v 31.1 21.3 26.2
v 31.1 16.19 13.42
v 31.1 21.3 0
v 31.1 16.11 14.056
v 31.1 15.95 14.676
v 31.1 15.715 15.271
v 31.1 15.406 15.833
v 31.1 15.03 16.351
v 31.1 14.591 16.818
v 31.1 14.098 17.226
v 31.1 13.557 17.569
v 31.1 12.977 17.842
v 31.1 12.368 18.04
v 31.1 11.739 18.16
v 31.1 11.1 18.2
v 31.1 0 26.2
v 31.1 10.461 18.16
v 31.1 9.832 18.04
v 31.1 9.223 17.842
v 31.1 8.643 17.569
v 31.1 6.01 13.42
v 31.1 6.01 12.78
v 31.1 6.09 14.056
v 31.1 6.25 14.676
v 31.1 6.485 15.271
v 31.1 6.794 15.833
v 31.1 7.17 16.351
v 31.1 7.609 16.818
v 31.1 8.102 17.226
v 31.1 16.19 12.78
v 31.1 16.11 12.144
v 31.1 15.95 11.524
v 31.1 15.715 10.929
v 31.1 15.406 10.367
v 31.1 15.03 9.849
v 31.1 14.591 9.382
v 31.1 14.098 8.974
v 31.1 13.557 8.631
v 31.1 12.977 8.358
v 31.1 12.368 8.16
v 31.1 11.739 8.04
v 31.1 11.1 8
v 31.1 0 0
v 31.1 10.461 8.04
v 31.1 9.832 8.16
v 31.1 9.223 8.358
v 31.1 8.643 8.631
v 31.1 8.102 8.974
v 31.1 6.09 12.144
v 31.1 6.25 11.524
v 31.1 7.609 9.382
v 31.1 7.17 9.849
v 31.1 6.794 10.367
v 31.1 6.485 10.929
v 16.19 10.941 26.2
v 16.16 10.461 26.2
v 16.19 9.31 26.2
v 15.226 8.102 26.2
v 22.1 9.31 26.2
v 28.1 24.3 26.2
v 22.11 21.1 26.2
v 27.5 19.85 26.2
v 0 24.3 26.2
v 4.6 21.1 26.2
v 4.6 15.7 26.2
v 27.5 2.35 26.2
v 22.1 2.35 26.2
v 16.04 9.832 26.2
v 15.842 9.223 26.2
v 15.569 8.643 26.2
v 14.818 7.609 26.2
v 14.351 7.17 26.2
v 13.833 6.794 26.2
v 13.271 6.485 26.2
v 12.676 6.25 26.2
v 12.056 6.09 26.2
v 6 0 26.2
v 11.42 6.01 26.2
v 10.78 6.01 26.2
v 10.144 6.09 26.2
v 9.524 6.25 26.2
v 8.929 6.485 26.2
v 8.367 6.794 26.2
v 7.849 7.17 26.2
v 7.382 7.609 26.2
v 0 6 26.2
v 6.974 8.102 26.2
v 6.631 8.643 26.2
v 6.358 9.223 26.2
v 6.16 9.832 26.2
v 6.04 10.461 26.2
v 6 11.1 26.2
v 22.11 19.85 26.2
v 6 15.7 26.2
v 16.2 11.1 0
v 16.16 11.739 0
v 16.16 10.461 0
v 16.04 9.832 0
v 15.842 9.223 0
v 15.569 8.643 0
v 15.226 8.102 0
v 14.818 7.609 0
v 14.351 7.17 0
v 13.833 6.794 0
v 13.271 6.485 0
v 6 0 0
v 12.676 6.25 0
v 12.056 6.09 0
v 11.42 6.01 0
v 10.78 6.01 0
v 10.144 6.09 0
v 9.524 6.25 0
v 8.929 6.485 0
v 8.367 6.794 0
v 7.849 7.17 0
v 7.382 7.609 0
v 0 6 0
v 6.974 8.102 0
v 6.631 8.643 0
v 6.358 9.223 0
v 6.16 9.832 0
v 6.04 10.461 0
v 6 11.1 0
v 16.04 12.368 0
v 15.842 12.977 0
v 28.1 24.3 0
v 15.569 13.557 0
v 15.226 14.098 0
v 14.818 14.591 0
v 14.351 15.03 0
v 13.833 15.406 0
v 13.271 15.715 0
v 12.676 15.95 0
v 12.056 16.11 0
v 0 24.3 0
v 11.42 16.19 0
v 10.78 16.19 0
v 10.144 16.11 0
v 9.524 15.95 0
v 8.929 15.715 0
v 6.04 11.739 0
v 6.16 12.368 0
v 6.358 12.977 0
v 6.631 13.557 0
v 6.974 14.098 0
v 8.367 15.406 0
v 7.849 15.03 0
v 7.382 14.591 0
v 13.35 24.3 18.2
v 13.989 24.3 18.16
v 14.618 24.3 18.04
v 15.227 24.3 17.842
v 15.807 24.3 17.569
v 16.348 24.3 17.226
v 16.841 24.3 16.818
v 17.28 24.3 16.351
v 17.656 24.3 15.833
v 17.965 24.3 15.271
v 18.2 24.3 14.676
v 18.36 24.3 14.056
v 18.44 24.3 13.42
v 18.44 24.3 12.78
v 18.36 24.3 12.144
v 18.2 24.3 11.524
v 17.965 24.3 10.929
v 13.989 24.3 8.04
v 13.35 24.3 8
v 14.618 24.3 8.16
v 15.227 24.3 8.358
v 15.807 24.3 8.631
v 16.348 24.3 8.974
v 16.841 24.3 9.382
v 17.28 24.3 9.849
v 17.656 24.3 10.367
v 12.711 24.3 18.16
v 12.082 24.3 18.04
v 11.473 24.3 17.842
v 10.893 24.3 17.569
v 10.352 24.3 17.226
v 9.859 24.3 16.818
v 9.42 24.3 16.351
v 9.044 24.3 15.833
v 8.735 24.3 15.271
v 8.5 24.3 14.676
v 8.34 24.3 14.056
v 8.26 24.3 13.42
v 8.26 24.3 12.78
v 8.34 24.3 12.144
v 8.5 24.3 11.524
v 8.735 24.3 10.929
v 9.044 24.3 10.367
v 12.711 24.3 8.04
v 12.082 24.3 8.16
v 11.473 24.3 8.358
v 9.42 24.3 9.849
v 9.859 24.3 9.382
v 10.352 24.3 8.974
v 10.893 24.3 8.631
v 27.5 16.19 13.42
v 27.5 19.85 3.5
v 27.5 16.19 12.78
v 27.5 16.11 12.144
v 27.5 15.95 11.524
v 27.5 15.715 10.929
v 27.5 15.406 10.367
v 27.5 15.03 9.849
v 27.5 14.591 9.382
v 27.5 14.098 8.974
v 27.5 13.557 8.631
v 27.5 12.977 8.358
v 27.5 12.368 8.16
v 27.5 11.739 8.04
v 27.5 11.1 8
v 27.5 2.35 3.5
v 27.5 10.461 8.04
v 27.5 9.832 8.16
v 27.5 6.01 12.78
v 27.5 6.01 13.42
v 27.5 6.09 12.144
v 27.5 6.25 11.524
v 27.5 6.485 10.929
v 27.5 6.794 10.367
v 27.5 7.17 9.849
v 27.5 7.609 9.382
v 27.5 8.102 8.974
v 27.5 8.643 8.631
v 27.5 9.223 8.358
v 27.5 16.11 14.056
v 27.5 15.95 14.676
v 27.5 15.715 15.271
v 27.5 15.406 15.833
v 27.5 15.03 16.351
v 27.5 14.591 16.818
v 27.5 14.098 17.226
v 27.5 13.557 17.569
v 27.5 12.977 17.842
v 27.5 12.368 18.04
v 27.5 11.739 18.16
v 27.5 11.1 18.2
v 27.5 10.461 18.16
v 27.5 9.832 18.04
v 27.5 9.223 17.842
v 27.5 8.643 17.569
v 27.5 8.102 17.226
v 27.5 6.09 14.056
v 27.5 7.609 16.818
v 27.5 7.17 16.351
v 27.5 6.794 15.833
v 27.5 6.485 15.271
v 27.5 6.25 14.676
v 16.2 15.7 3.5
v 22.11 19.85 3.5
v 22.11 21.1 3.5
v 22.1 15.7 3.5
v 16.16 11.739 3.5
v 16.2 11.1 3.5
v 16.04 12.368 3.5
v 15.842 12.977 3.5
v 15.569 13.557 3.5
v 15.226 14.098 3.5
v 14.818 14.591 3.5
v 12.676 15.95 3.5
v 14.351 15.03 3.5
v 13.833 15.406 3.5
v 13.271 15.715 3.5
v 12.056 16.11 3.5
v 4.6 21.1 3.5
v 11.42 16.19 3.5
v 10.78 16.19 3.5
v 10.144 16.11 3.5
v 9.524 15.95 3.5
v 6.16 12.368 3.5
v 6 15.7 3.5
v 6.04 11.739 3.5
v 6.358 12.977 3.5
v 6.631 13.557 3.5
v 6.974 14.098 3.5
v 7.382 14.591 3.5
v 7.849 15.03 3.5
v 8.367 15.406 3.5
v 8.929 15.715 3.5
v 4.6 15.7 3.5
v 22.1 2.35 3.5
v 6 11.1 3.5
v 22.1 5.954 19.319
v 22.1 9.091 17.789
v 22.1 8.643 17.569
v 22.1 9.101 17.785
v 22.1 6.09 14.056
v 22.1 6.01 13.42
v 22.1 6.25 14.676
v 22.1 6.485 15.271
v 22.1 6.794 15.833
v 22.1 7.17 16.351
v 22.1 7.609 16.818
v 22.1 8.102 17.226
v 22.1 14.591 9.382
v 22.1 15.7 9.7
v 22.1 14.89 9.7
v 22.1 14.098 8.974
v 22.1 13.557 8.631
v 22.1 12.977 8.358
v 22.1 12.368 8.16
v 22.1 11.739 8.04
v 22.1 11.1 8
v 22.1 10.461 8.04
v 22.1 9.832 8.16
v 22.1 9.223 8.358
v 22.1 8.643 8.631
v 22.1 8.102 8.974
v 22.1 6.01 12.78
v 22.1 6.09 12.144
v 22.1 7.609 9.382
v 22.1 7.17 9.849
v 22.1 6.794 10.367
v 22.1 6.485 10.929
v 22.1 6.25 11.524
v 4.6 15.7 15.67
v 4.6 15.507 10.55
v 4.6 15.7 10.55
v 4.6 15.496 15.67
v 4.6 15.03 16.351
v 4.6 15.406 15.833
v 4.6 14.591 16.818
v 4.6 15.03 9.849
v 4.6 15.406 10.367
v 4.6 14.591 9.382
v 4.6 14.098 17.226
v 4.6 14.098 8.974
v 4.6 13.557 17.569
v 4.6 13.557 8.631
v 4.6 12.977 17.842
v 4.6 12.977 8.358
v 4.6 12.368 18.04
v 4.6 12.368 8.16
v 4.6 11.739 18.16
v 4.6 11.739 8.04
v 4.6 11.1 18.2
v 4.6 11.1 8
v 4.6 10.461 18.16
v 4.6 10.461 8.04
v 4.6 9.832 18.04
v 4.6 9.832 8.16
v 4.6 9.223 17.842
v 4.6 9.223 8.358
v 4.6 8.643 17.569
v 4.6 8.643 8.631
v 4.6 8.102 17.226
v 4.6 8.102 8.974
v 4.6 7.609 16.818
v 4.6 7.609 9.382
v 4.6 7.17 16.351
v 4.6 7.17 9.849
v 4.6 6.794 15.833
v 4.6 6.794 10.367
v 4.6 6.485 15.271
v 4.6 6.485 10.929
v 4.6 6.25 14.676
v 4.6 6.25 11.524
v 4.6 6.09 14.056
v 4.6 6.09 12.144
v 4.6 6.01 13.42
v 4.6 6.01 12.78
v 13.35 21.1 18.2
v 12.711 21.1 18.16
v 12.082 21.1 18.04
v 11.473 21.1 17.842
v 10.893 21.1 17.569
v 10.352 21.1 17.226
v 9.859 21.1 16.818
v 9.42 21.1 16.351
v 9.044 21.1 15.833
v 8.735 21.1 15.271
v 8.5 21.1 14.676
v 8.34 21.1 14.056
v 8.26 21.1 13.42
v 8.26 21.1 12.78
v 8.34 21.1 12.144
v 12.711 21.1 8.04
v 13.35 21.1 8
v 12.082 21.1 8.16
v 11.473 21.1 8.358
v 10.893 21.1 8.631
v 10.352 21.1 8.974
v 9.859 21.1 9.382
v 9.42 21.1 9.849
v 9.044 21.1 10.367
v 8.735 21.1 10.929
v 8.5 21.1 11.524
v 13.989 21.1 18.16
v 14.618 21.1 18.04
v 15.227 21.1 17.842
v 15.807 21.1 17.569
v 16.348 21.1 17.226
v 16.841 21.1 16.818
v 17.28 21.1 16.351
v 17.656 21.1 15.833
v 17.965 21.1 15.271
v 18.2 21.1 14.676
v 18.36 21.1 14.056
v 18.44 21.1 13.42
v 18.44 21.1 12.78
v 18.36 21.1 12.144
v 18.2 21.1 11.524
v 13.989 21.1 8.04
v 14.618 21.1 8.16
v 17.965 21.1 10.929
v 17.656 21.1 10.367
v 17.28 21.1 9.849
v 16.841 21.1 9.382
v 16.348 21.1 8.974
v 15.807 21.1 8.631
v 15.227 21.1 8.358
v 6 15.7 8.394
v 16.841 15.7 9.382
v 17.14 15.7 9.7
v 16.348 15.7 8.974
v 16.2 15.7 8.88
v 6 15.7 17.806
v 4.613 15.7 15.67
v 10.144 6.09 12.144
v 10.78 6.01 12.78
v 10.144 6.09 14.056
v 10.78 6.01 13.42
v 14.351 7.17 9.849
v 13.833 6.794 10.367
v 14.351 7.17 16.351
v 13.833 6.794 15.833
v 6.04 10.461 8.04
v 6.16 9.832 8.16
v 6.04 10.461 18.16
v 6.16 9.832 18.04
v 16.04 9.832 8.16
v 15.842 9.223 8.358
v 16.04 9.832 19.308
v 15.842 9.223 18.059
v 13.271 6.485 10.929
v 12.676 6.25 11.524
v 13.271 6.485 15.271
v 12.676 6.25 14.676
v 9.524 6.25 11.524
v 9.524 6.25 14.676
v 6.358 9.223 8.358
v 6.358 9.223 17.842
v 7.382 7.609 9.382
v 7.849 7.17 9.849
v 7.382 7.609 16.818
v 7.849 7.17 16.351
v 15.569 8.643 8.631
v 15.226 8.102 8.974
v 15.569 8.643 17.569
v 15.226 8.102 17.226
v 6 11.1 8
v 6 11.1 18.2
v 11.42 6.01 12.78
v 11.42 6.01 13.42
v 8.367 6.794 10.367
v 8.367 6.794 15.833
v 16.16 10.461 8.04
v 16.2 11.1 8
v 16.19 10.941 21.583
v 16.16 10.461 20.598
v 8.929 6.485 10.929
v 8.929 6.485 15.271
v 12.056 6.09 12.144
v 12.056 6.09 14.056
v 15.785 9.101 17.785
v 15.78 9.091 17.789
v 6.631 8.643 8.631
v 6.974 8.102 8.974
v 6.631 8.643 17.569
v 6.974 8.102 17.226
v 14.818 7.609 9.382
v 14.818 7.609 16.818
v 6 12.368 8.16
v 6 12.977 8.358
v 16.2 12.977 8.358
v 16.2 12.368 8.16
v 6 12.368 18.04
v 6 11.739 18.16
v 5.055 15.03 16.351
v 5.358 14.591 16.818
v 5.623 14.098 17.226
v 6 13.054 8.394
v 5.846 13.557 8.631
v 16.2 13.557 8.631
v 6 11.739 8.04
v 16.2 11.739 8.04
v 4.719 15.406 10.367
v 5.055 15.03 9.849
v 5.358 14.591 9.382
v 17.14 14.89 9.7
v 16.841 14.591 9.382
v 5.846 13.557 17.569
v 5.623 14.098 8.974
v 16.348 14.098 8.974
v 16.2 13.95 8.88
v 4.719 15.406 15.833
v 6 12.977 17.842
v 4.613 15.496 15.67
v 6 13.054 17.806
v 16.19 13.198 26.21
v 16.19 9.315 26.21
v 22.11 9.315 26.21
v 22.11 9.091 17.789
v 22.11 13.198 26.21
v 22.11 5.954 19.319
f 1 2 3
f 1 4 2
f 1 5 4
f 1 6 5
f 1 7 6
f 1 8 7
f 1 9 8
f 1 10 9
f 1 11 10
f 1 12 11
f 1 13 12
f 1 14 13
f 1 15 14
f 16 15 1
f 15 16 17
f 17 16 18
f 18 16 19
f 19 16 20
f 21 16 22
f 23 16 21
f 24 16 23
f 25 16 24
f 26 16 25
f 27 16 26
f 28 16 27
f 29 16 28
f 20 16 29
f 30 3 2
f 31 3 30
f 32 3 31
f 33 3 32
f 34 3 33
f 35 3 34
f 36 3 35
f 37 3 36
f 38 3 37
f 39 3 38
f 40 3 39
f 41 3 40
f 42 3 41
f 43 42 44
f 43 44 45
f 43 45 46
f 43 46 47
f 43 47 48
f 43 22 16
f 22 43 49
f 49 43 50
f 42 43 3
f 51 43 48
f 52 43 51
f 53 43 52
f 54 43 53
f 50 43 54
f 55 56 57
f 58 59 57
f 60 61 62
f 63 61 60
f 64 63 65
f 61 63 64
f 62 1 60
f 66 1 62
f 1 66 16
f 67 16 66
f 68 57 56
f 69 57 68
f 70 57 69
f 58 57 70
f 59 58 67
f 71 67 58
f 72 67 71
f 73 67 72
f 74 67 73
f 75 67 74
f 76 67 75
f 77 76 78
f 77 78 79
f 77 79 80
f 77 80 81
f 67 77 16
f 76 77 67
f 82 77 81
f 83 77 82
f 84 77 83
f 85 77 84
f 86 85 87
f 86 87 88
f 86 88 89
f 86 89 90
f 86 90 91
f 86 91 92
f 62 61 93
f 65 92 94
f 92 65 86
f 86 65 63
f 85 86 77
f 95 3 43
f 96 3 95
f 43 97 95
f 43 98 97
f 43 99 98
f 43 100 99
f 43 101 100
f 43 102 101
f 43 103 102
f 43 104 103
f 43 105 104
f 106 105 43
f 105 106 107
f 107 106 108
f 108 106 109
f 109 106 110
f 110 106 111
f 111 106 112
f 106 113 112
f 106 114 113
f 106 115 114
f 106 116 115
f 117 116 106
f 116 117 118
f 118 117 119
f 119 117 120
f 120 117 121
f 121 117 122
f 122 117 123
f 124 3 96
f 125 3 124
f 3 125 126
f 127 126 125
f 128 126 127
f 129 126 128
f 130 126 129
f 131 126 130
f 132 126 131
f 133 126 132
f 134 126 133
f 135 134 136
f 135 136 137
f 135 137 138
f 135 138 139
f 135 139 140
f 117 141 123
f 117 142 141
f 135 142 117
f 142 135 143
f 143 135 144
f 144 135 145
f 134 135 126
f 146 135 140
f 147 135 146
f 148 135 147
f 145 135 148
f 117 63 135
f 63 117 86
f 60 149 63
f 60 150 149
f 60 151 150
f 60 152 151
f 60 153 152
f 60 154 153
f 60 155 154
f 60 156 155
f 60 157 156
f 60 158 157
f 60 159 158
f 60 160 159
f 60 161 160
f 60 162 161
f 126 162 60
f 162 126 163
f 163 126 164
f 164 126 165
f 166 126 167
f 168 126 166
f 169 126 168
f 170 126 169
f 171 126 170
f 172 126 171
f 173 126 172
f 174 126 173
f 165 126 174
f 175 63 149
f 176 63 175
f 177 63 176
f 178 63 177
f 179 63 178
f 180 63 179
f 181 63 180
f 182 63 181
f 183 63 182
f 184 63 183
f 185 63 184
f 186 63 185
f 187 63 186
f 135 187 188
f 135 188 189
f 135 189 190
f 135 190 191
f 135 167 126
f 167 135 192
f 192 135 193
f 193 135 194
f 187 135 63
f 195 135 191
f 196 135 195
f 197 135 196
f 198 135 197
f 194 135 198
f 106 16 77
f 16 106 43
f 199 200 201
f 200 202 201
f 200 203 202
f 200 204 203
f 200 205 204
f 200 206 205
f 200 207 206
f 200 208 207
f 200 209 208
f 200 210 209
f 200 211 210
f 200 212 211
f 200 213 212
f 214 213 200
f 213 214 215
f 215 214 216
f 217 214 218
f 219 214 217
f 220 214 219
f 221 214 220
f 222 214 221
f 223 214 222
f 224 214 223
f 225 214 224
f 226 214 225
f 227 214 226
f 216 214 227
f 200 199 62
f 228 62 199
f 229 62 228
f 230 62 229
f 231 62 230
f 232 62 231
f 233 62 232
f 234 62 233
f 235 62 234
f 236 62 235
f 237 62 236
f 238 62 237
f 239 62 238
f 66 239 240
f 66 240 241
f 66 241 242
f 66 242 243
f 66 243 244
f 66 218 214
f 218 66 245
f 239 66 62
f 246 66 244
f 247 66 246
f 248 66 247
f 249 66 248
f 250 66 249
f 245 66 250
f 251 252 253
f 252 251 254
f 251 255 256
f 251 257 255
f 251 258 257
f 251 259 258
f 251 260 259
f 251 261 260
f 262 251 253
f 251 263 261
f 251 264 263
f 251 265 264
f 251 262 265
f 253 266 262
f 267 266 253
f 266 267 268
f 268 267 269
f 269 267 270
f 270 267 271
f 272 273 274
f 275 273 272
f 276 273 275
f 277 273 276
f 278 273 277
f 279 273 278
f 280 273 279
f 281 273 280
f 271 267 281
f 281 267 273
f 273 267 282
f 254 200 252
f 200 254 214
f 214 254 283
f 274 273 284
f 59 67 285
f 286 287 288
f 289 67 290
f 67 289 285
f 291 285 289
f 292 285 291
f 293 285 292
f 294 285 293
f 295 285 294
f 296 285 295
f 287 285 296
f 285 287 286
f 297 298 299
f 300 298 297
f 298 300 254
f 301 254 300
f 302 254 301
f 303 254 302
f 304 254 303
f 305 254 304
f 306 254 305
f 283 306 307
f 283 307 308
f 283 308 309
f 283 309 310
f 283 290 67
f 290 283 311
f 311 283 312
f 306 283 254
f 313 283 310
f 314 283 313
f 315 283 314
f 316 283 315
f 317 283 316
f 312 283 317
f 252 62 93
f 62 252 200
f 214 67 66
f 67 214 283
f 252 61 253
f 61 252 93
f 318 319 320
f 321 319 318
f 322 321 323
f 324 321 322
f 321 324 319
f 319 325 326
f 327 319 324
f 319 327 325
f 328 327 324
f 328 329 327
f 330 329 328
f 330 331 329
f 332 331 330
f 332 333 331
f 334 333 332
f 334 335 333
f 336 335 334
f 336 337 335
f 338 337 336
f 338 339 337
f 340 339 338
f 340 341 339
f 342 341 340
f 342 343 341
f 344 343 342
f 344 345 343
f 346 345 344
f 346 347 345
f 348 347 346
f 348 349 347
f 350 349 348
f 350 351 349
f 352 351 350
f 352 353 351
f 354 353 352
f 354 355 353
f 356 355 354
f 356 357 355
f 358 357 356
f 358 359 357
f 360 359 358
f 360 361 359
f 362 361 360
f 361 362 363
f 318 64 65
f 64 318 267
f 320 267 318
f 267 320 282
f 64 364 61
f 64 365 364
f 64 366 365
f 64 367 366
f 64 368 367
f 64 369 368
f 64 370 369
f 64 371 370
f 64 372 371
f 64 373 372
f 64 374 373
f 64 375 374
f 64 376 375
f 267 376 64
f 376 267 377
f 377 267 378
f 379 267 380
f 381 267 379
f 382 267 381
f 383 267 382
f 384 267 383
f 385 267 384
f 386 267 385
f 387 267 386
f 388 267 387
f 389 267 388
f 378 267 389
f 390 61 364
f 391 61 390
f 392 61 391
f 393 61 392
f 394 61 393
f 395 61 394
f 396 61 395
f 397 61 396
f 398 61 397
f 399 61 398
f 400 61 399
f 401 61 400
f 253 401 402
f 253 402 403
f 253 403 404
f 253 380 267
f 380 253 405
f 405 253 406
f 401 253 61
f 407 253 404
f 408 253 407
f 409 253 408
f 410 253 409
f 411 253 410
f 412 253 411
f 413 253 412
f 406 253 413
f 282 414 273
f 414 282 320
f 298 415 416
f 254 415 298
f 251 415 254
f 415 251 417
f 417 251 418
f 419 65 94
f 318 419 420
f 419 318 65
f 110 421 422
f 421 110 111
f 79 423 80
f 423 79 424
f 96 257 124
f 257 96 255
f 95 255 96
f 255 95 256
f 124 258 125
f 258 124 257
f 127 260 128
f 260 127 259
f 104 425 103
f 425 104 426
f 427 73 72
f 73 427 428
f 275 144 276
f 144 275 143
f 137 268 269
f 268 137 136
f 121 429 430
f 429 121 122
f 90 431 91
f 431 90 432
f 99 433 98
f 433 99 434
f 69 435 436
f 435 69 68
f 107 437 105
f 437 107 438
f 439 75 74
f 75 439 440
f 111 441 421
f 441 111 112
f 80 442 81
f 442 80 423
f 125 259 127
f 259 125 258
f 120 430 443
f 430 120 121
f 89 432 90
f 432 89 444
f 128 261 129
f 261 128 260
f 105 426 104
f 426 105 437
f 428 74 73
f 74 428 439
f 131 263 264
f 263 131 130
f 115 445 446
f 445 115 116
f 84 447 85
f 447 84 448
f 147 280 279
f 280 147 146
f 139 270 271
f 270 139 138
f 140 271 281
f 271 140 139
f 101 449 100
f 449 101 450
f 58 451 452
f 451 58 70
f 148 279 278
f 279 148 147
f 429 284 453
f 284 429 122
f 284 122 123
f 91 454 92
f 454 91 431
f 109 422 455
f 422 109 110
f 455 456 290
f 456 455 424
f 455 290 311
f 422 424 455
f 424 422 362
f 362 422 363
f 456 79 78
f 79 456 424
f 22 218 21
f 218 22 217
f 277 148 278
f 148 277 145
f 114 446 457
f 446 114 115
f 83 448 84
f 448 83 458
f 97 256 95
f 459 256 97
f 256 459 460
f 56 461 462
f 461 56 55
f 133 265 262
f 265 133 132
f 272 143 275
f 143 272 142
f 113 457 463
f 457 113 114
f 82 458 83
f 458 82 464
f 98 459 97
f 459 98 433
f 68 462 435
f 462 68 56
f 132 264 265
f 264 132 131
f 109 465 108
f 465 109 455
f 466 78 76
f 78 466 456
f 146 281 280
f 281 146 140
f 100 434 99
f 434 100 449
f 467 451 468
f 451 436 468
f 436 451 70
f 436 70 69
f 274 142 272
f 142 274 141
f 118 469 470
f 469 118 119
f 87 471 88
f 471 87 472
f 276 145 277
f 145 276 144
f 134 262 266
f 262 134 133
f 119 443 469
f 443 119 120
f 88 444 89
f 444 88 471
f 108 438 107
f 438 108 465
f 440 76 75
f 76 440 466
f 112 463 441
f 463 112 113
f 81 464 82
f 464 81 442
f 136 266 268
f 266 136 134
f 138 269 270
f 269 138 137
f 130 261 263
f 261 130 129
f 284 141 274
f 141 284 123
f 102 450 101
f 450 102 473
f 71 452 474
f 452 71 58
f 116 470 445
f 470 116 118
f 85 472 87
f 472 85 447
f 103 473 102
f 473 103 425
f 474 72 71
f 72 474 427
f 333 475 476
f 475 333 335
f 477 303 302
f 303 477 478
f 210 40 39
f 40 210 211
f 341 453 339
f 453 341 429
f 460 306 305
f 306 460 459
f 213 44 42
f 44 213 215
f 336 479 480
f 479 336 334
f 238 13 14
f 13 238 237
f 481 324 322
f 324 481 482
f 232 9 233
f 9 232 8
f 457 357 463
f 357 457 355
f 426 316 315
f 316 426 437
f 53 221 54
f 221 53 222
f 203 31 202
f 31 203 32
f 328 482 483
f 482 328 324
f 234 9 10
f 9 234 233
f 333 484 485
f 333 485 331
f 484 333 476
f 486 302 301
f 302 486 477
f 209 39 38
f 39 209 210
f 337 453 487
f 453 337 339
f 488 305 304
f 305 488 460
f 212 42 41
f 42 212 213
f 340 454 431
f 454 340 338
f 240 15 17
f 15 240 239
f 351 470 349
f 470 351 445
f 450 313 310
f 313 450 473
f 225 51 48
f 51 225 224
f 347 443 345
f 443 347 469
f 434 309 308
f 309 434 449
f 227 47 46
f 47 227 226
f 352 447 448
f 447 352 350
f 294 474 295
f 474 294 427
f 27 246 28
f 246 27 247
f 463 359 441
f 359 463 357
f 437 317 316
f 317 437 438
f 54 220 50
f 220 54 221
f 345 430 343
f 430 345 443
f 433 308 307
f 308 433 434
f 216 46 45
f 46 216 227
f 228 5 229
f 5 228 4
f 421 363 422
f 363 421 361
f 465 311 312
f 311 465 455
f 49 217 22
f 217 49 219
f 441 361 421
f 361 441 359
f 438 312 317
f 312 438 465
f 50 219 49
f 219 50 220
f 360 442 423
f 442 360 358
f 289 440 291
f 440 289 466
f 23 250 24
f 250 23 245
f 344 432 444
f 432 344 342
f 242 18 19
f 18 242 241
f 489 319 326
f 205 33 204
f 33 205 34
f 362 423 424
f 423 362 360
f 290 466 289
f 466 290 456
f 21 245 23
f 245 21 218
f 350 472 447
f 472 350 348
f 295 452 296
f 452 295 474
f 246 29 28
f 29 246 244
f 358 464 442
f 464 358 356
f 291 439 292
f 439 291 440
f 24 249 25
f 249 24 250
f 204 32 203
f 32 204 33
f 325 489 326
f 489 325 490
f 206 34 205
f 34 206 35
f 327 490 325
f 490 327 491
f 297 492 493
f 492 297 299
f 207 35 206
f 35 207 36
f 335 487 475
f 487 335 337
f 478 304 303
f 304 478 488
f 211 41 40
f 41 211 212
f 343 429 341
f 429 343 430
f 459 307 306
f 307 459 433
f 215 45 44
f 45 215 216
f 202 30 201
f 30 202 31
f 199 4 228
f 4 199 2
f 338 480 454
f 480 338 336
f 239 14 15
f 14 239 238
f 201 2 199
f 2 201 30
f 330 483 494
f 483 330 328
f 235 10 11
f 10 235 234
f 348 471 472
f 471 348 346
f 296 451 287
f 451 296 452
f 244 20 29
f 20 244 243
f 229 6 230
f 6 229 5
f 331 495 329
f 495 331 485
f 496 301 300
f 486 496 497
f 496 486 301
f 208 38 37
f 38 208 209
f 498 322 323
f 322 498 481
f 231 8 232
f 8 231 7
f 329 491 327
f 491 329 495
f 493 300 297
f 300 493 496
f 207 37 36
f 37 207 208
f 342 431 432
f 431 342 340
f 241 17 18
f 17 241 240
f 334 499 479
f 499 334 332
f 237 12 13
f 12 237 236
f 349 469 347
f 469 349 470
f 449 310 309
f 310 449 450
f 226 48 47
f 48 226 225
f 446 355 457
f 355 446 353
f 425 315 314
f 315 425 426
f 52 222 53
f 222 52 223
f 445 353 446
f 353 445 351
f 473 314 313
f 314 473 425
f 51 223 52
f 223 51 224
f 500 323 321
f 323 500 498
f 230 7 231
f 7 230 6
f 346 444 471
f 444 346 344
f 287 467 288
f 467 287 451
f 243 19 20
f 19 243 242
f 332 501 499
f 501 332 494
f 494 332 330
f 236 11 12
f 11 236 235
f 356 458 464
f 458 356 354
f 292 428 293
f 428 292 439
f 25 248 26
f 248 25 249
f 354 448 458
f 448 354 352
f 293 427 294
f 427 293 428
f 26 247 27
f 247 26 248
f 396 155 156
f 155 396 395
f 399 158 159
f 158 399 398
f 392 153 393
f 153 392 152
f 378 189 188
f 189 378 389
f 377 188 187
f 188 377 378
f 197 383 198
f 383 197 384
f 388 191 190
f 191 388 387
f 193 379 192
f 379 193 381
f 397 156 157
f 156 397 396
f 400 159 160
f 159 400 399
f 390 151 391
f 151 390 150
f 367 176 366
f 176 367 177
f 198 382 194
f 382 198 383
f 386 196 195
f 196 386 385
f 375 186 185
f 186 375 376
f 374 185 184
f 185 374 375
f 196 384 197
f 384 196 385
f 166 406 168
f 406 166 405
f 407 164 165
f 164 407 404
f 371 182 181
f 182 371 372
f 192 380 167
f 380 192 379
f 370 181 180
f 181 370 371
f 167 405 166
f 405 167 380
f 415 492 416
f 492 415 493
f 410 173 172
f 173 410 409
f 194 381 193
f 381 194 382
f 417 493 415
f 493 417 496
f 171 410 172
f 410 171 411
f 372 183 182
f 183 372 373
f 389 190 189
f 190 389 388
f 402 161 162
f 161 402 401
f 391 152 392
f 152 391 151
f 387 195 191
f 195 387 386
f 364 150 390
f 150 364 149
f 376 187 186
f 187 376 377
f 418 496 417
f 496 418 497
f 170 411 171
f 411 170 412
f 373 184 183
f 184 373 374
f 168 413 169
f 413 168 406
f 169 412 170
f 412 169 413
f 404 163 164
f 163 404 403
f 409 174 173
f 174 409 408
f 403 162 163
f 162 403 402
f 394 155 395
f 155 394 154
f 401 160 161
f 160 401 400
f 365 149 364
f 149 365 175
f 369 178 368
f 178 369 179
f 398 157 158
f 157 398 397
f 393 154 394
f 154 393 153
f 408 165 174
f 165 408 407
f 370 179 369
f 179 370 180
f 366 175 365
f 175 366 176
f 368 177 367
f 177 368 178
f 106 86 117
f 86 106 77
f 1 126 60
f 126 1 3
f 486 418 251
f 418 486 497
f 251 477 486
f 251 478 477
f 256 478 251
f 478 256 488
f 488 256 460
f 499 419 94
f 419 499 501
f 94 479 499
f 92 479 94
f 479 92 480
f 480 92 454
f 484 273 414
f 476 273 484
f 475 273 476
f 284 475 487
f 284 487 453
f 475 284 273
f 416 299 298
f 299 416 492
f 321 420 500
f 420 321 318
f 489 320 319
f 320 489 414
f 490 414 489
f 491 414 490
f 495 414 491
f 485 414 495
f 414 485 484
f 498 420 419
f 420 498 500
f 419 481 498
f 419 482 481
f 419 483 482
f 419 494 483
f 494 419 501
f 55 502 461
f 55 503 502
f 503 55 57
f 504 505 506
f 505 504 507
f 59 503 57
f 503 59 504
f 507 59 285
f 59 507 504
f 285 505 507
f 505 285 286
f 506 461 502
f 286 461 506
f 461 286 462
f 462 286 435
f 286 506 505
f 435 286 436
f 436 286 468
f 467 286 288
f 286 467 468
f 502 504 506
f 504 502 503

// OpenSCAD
// file: nut.scad
// Nut model.

$fn = 50;
OX = 0.01;

// 2D nut polygon.
module regular_polygon(order, r = 1) {
    angles = [for(i = [0 : order - 1]) i * (360 / order)];
    coords = [for(th = angles) [r * cos(th), r * sin(th)]];
    polygon(coords);
}

// Simple nut model.
// d - rod diameter.
// m - nut height.
// e - max outer nut diameter.
// order - nut corner count.
// material - nut color.
module nut(d = 10, m = 5, e = 20, order = 6, material = [0.8, 0.8, 0.8]) {
    color(material) difference() {
        linear_extrude(height = m) regular_polygon(order, e / 2);
        translate([0, 0, -OX]) cylinder(r = d / 2, h = m + 2 * OX);
    }
}

// Example:
nut(10, 5, 20);
// main file
// Rod mount.

use <nut.scad>;

$fn = 50;
OX = 0.01;

// Base model for printing.
// d - rod diameter.
// m - nut height.
// e - max outer nut diameter.
// s - min outer nut diameter.
// plexiglass - plexiglass thickness.
module rod_mount(d = 10 + 0.2, m = 5 + 0.4, e = 19 + 0.2, s = 17 + 0.5, plexiglass = 6) {
	biasX = 7.25 - 5.0; // Radiator rod X bias (difference between rod radius and EKWB fan hole).
	biasY = -0.5; // Radiator rod Y bias (default ~ 3.0).
	borderX = 3.6; // Support border width.
	borderY = 3.2;
	borderZ = 3.5; // Hidden side borders.
	bulkhead = 0.0; // Bulkhead offset (default ~ 1.5).
	radius = d / 2;
	pr = plexiglass + radius;
	// Mount dimensions:
	y = plexiglass + d + biasY + m + borderY;
	x = pr + biasX + s / 2 + m + borderX + bulkhead; // Make model more square.
	z = e + 2 * borderZ;
	// Model:
	difference() { 
		union() {
			// Main model:
			difference() {
				// Base:
				cube([x, y, z]);
				// Nut places:
				translate([pr + biasX + s / 2 + bulkhead, pr - s / 2, borderZ]) difference() {
					cube([m, s, e + borderZ + OX]);
				}
				translate([pr + biasX - s / 2, plexiglass + d + biasY, borderZ]) difference() {
					cube([s + OX, m, e + borderZ + OX]);
				}
				// Rod holes:
				translate([pr, pr, -OX]) cylinder(r = radius, h = z + 2 * OX); // Side rod hole.
				translate([plexiglass - (s - d) / 2 + biasX, pr, borderZ + e / 2]) rotate([0, 90, 0]) cylinder(r = radius, h = x + 2 * OX); // Vertical rod hole.
				translate([pr + biasX, pr, borderZ + e / 2]) rotate([0, 90, 90]) cylinder(r = radius, h = y + 2 * OX); // Horizontal rod hole.
				// Bevels:
				translate([plexiglass + OX, -OX, -OX]) rotate([0, 0, 135]) cube([2 * plexiglass, 2 * plexiglass, z + 2 * OX]);
				translate([x + plexiglass / 2, y - plexiglass, -OX]) rotate([0, 0, 45]) cube([2 * plexiglass, 2 * plexiglass, z + 2 * OX]);
				// Simplification:
				translate([plexiglass, plexiglass + radius, borderZ]) cube([d, radius + OX, z]);
				translate([pr, pr, borderZ + e / 2 - radius / 1.5]) cube([s / 2 + biasX + OX, radius + OX, e]); // Overhang.
				// Stockade:
				translate([pr + biasX - s / 2, pr - OX, borderZ + e / 2 - radius / 2]) cube([s + OX, radius + 2 * OX, radius + 2 * OX]);
				translate([plexiglass + biasX - (s - d) / 2, pr - OX, borderZ + e / 2 - radius / 2]) rotate([0, 57, 0]) cube([radius + 2 * OX, radius + 2 * OX, radius + 2 * OX]);
				translate([plexiglass + biasX - (s - d) / 2, pr - OX, borderZ + e / 2 + radius / 2]) rotate([0, 90 - 57, 0]) cube([radius + 2 * OX, radius + 2 * OX, radius + 2 * OX]);
				
			}
			// Bevel stockade:
			translate([plexiglass + d - OX, pr - 2, borderZ + e / 2 + radius - 0.415]) rotate([64, 0, 0]) {
				cube([x - plexiglass - d - m - borderX + 2 * OX, borderZ + e / 2, borderZ]);
			}
		}
		// Difference for bevel stockade:
		translate([plexiglass + d - OX, pr - 2, borderZ + e / 2 + radius - 0.415]) rotate([64, 0, 0]) {
			translate([- m / 2, 0, -borderZ + OX])
				cube([x - plexiglass - d - borderX + 2 * OX, borderZ + e / 2, borderZ]);
		}
		// Cap:
		translate([0, 0, z + OX])
		cube([x, y, m]);
	}
}

// Rod mount with nuts for visualization.
module rod_mount_nut(mountColor = [1.0, 0.0, 0.0], nutColor = [0.8, 0.8, 0.8]) {
	d = 10.2; // Rod diameter for model.
	m = 5; // Nut height.
	e = 19; // Max outer nut diameter.
	order = 6;
	color(mountColor) rod_mount();
	side = 6 + d / 2;
	translate([side, side, 26.2]) nut(d, m, e, order, nutColor);
	translate([side, side, -5.0]) nut(d, m, e, order, nutColor);
	translate([30.8, side, 13.1]) rotate([0, 90, 0]) nut(d, m, e, order, nutColor);
	translate([side + 2, 29.3, 13.1]) rotate([90, 0, 0]) nut(d, m, e, order, nutColor);
}

// Example for printing:
rod_mount(); // Not inverted model.
//translate([0, 24.3, 0]) mirror([0, 1, 0]) rod_mount(); // Inverted model.

// Nuts to visualize result:
//rod_mount_nut(); // Not inverted model.
//translate([0, 24.3, 0]) mirror([0, 1, 0]) rod_mount_nut(); // Inverted model.
